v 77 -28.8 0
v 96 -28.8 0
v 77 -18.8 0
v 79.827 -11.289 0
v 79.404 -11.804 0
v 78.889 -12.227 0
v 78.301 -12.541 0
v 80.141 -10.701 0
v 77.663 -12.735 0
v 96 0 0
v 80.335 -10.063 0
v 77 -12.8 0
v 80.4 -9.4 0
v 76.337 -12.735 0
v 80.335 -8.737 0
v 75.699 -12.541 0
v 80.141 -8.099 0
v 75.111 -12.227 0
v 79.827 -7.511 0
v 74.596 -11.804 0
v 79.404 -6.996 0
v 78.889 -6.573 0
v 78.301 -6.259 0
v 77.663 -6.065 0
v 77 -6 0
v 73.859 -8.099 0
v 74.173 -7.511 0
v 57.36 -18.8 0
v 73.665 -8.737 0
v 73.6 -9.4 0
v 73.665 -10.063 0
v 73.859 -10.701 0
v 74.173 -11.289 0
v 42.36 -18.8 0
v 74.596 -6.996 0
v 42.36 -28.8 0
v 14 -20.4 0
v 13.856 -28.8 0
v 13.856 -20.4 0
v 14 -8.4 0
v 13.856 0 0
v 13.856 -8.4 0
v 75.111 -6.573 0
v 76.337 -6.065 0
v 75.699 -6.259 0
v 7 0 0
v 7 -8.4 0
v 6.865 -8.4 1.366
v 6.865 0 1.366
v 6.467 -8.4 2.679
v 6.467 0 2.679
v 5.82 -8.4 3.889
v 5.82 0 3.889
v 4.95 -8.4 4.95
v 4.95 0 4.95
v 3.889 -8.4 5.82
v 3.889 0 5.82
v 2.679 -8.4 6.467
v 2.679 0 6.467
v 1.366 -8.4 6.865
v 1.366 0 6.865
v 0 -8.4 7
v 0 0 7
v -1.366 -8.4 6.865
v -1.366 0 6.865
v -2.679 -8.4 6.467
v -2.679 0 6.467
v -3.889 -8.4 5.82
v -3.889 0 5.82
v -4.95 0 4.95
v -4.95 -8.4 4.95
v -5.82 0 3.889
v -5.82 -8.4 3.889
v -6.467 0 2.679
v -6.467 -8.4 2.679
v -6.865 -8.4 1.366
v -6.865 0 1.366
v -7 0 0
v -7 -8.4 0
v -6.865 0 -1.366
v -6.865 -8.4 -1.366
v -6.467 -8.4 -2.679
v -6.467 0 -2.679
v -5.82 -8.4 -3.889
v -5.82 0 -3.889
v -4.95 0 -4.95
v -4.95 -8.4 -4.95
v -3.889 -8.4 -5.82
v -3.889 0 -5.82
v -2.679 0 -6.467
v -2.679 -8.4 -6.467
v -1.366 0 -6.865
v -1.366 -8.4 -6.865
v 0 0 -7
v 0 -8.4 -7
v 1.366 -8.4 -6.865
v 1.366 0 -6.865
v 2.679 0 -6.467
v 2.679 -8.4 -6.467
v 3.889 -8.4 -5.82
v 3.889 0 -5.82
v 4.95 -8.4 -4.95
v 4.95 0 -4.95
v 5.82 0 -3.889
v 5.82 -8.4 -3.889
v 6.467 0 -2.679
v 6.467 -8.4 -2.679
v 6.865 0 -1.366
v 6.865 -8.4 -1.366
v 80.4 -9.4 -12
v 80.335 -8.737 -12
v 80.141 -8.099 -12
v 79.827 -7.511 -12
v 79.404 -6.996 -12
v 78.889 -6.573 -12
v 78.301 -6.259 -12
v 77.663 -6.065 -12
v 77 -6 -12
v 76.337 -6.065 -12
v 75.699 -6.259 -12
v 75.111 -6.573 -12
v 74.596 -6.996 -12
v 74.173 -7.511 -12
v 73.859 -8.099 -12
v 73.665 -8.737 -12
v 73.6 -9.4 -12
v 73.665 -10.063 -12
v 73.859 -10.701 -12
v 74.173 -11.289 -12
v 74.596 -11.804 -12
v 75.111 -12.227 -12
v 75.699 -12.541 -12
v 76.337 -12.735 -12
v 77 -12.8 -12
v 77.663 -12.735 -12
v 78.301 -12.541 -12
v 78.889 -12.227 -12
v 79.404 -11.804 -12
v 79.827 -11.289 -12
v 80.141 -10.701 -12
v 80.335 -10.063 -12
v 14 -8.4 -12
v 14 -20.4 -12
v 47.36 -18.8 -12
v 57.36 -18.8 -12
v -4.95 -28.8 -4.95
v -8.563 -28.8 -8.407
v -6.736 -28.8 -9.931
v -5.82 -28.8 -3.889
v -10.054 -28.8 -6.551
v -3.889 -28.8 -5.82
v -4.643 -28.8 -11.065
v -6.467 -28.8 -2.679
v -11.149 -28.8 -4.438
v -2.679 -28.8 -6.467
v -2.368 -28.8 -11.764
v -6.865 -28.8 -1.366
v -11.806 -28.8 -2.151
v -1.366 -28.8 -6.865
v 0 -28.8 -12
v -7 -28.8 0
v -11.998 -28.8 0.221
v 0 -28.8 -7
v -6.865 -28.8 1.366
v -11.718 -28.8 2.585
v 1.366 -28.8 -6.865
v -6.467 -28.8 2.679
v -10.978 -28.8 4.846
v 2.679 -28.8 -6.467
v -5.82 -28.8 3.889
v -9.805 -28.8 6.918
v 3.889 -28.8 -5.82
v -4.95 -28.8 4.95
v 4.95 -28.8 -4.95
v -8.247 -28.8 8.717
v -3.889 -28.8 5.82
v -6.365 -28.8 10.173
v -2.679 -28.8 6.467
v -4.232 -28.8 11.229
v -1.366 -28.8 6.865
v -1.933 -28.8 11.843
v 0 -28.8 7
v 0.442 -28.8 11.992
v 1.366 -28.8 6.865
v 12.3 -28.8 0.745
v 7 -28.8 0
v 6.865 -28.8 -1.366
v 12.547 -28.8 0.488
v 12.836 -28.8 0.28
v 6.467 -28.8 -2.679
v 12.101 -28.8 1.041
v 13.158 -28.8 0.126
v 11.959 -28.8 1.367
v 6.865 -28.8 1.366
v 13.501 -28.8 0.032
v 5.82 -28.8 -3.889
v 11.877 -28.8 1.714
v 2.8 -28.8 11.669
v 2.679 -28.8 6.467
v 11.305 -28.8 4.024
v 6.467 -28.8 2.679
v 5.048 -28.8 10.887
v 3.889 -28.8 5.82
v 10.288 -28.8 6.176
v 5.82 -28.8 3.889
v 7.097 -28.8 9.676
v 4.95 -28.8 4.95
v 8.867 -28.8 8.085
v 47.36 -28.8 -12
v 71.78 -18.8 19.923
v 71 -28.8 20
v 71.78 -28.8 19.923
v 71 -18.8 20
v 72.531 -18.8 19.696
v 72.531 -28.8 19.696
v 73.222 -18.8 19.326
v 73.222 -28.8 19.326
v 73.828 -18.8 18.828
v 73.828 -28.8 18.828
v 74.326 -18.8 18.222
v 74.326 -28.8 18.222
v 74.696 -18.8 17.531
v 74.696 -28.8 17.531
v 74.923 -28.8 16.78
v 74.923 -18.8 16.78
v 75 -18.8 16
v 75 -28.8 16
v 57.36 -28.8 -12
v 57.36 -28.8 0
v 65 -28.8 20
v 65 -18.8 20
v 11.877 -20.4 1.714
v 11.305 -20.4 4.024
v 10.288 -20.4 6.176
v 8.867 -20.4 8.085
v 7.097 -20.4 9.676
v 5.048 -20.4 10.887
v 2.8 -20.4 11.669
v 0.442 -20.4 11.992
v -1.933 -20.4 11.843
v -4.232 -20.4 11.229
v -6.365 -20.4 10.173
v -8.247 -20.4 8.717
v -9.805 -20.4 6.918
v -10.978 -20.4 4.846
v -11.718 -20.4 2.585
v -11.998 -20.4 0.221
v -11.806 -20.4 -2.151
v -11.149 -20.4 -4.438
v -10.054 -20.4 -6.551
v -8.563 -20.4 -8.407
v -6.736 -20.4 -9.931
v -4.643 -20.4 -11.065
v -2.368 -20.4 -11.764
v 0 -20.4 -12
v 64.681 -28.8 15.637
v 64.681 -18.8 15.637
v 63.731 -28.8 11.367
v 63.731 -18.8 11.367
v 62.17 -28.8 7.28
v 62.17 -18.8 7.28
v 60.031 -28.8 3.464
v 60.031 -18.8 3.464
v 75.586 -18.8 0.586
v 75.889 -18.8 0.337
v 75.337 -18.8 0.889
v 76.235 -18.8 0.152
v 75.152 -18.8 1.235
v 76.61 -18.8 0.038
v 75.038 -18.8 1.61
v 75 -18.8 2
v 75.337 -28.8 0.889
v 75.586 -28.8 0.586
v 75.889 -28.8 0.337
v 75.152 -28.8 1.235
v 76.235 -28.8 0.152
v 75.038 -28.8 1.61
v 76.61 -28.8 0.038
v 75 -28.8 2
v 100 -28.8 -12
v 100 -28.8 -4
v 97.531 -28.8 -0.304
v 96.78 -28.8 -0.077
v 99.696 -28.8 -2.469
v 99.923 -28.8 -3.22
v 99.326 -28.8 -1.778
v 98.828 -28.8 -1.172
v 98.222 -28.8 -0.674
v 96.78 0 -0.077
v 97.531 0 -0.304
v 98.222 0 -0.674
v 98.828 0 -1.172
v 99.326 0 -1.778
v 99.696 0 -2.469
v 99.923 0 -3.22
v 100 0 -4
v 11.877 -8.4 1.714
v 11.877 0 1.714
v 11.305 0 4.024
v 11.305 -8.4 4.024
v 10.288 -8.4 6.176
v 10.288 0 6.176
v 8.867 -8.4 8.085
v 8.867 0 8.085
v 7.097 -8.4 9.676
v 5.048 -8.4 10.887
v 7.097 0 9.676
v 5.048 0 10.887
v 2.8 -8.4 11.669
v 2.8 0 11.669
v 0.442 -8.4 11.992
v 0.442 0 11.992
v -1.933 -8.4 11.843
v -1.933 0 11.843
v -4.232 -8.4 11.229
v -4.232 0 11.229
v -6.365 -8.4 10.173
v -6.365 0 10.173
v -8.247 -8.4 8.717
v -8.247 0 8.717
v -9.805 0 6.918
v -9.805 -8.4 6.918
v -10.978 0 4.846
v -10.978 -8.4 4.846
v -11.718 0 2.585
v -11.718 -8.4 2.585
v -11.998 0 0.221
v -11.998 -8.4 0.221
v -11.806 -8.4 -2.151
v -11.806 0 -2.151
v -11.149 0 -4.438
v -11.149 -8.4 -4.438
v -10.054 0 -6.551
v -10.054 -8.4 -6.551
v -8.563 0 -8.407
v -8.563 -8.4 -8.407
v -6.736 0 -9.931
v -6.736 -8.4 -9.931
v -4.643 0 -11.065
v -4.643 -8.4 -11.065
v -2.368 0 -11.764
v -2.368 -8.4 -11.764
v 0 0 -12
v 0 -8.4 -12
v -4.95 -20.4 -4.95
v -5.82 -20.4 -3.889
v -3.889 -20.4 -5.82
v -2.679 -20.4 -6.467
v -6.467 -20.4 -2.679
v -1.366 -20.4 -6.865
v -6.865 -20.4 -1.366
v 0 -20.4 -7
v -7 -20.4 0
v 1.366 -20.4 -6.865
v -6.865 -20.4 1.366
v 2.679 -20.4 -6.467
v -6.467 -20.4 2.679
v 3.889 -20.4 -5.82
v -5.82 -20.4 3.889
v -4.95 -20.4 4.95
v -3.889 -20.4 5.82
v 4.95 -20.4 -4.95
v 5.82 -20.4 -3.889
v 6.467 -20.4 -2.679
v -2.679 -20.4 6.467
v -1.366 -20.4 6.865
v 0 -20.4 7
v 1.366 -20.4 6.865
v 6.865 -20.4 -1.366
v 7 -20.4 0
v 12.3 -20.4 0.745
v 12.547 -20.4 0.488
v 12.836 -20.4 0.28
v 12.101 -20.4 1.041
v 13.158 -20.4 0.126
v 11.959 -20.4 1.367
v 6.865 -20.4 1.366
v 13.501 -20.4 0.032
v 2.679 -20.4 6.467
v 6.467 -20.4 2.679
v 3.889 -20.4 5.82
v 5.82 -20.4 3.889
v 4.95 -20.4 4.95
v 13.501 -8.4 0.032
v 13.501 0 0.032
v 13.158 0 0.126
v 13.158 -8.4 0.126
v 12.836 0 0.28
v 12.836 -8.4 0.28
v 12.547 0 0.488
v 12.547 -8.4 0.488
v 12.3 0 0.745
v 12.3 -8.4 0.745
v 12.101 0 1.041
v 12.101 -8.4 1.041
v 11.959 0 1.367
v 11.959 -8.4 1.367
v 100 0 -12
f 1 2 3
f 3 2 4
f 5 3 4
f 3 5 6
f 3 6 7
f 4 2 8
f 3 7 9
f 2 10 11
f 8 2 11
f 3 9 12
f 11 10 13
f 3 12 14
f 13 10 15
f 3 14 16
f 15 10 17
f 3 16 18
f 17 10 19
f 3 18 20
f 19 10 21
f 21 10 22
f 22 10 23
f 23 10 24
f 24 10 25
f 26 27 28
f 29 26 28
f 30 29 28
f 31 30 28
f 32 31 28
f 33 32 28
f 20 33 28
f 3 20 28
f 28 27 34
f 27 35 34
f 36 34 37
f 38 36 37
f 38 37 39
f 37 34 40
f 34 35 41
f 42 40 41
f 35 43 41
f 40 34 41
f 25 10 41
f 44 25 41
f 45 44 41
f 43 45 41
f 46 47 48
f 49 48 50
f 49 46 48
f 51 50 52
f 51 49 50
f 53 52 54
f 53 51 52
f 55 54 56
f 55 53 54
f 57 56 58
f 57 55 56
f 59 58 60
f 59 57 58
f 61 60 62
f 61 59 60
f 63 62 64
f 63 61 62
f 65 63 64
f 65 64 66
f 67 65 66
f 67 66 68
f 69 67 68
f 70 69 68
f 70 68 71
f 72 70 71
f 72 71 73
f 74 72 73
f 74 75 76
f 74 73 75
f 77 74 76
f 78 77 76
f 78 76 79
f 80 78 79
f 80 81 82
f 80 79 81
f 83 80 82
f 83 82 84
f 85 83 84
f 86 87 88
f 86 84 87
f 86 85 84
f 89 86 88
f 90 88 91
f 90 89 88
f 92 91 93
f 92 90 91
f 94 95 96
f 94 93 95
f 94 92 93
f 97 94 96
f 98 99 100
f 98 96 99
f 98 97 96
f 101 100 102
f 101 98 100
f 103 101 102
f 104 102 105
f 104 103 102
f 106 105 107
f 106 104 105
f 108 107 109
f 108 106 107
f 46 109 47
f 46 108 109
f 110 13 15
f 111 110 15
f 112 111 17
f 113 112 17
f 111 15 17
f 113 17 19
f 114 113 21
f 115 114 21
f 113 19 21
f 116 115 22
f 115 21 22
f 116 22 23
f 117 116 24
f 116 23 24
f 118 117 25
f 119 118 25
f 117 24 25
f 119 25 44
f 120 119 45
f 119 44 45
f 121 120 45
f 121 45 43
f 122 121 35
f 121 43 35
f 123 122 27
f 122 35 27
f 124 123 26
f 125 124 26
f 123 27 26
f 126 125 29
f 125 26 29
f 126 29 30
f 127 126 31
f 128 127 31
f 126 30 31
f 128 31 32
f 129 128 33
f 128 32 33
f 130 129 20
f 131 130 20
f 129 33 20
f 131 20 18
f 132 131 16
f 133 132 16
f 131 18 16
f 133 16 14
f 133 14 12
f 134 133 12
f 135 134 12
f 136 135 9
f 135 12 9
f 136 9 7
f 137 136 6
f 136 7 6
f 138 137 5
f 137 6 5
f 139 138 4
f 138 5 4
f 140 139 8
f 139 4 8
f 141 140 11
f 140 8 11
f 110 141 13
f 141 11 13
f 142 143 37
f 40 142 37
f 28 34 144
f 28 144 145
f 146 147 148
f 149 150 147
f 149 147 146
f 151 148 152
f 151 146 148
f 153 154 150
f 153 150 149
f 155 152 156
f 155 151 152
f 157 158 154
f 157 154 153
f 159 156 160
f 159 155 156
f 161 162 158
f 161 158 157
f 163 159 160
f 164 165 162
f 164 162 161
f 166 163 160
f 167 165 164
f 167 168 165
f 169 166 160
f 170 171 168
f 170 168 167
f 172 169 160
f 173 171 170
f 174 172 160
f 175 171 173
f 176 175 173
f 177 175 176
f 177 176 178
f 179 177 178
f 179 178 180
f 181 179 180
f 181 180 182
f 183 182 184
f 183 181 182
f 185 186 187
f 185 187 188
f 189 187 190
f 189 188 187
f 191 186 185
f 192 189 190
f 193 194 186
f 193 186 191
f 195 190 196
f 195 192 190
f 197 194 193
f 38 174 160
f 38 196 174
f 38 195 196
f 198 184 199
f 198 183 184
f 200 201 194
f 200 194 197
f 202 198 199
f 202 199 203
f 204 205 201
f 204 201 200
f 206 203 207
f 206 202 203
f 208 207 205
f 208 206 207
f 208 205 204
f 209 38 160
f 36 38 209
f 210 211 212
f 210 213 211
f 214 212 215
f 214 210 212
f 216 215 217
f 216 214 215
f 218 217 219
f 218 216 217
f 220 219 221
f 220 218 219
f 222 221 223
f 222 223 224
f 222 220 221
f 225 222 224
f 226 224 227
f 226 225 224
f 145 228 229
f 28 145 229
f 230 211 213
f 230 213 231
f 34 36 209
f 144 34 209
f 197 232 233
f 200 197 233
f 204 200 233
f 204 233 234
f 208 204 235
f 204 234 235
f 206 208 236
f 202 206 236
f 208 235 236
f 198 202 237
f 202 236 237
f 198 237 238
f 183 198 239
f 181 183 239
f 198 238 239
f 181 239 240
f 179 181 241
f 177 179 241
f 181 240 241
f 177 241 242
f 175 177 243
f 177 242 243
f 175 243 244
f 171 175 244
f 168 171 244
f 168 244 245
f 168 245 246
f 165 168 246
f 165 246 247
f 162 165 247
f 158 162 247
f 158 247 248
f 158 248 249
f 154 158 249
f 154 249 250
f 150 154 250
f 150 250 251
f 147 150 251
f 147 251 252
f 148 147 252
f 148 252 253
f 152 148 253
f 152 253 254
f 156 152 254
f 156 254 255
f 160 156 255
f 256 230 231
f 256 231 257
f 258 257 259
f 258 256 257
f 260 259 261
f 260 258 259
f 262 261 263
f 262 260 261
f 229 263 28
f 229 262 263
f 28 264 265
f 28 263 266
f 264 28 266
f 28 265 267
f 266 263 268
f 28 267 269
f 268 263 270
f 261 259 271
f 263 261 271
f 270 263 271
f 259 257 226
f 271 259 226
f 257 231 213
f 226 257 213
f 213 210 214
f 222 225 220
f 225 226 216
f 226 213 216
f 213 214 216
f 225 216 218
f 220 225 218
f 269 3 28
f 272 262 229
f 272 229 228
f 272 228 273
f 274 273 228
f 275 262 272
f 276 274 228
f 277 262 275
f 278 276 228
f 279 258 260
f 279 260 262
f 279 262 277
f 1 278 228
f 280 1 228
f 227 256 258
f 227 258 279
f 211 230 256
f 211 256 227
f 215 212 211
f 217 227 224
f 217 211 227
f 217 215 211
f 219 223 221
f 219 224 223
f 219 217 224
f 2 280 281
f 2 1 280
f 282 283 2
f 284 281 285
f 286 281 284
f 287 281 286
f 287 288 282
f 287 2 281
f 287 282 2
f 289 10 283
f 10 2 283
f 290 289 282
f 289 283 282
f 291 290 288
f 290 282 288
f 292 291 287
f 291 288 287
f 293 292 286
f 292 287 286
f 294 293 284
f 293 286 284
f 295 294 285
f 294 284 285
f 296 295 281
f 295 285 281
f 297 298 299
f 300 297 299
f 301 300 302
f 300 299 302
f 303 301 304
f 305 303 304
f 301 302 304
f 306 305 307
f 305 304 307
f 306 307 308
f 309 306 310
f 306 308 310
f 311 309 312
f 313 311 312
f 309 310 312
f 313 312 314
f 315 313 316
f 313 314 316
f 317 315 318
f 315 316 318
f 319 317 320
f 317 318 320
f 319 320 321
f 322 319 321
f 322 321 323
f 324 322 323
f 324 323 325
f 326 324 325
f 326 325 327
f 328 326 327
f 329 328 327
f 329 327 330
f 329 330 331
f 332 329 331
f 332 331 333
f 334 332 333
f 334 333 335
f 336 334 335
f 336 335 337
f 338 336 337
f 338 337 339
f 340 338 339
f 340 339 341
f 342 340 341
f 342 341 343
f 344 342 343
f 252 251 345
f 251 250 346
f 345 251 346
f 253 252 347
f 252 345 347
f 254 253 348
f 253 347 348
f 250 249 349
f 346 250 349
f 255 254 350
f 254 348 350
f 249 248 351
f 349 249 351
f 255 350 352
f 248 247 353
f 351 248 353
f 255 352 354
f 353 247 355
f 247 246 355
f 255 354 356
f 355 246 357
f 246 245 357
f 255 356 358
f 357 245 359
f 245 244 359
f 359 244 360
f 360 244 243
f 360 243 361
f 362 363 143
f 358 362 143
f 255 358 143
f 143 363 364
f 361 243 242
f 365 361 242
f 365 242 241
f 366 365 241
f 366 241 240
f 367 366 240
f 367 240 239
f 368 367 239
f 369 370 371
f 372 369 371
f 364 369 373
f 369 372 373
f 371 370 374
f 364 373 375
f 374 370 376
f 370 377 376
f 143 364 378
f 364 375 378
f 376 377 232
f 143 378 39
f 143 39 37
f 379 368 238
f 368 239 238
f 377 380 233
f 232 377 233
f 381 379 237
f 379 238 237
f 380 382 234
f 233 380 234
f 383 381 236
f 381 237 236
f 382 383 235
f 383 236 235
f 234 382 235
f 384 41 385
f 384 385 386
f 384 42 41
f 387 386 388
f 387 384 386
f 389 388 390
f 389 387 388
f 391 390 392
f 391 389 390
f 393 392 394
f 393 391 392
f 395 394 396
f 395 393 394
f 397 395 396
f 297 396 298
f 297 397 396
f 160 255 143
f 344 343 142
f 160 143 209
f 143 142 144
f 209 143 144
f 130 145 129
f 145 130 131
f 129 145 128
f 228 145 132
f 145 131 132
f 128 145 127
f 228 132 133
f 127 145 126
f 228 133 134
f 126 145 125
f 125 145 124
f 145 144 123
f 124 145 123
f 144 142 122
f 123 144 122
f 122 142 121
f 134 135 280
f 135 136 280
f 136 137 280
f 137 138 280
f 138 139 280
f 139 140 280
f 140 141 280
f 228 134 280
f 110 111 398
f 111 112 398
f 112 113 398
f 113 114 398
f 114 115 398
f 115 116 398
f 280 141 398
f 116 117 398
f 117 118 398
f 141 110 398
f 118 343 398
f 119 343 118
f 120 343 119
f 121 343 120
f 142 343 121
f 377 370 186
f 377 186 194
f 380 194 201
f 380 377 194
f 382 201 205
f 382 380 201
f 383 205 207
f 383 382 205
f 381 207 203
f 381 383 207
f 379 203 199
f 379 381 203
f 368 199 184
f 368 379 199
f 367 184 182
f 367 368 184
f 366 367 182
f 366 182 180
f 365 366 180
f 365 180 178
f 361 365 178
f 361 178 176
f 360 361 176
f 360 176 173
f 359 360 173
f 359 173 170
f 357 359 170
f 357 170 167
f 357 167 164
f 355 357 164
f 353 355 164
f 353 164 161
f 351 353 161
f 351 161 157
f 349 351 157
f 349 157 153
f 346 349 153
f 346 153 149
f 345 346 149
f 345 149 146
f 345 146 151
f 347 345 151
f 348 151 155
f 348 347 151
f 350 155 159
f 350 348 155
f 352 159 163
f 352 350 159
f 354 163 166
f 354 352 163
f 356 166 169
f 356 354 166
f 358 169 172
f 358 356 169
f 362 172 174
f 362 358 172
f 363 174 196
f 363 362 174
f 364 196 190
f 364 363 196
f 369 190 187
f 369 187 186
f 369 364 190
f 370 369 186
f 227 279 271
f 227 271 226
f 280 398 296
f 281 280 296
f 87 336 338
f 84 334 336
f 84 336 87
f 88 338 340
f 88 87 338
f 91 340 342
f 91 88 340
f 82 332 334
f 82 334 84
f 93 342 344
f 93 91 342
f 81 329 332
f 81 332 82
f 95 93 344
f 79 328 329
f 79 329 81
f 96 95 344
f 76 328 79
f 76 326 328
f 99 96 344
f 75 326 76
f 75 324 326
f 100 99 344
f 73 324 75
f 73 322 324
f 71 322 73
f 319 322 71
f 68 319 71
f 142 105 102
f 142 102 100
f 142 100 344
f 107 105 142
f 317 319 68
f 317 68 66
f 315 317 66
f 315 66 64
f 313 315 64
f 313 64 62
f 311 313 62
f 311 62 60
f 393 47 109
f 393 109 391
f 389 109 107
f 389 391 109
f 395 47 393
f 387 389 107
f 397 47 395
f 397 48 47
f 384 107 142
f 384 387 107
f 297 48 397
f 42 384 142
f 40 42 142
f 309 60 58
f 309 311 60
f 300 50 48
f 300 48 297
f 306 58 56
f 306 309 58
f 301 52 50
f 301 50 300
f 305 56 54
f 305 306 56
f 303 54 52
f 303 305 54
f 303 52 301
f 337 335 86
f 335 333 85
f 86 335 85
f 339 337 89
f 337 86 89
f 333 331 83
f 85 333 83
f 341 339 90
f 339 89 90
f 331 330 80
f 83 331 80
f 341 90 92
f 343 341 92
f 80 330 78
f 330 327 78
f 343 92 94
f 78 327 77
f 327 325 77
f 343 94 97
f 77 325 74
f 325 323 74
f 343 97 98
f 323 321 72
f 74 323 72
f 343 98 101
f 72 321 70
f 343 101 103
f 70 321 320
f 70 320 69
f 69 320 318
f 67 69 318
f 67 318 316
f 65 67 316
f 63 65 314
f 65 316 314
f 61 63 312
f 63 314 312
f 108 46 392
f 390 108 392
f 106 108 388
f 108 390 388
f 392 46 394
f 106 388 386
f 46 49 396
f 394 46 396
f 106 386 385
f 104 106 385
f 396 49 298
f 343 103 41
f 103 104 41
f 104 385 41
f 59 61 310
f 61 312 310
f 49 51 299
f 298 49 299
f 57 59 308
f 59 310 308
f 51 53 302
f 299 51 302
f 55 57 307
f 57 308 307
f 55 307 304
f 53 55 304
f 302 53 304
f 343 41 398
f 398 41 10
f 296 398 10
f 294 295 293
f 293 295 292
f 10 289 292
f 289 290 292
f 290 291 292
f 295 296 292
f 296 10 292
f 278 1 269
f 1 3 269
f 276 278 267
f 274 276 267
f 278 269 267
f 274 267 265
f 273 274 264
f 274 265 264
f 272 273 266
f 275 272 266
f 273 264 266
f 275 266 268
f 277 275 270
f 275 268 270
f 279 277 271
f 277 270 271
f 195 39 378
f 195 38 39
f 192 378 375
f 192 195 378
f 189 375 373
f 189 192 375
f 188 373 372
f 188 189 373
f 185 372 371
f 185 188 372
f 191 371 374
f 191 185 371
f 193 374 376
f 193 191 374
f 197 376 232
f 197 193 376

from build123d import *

# Parameters (mm, degrees)
F0_R      = 7
F1_DEPTH  = 28.8
F4_DEPTH  = 12
F6_DEPTH  = 10
F8_DEPTH  = 10
F9_R      = 3.4
F10_DEPTH = 12
F11_R     = 2
F12_R     = 4


with BuildPart() as f1:
    # F0 (on Front) → F1 (new body)
    with BuildSketch(Plane.XZ):
        with BuildLine():
            Line((100, 0), (12, 0))
            ThreePointArc((12, 0), (-8.4852813742, 8.4852813742), (0, -12))
            Line((0, -12), (100, -12))
            Line((100, -12), (100, 0))
        make_face()
        Circle(F0_R, mode=Mode.SUBTRACT)
    extrude(amount=F1_DEPTH)

    # F3 (on offset) → F4 (cut)
    with BuildSketch(Plane.XZ.offset(20.4)):
        with BuildLine():
            Line((14, -12), (14, 0))
            Line((14, 0), (12, 0))
            ThreePointArc((12, 0), (-8.4852813742, 8.4852813742), (0, -12))
            Line((0, -12), (14, -12))
        make_face()
    extrude(amount=-F4_DEPTH, mode=Mode.SUBTRACT)

    # F5 (on face) → F6 (join)
    with BuildSketch(Plane.XZ.offset(28.8)):
        with BuildLine():
            Line((57.36, 0), (65, 0))
            Line((65, 0), (75, 0))
            Line((75, 0), (75, 20))
            Line((75, 20), (65, 20))
            ThreePointArc((65, 20), (63.0248532563, 9.2952660561), (57.36, 0))
        make_face()
    extrude(amount=-F6_DEPTH)

    # F7 (on face) → F8 (cut, through all)
    with BuildSketch(Plane.XZ.offset(28.8)):
        Polygon((57.36, -12), (57.36, 0), (42.36, 0), (47.36, -12), align=None)
    extrude(amount=-F8_DEPTH, mode=Mode.SUBTRACT)

    # F9 (on face) → F10 (cut, through all)
    with BuildSketch(Plane.XY):
        with Locations((77, -9.4)):
            Circle(F9_R)
    extrude(amount=-F10_DEPTH, mode=Mode.SUBTRACT)

    # F11
    f11_edges = [f1.edges().sort_by_distance(p)[0] for p in [
        (75, -23.8, 0),
        (12, -24.6, 0),
        (12, -4.2, 0),
    ]]
    fillet(f11_edges, radius=F11_R)

    # F12
    f12_edges = [f1.edges().sort_by_distance(p)[0] for p in [
        (75, -23.8, 20),
        (100, -14.4, 0),
    ]]
    fillet(f12_edges, radius=F12_R)


solid = f1.part
